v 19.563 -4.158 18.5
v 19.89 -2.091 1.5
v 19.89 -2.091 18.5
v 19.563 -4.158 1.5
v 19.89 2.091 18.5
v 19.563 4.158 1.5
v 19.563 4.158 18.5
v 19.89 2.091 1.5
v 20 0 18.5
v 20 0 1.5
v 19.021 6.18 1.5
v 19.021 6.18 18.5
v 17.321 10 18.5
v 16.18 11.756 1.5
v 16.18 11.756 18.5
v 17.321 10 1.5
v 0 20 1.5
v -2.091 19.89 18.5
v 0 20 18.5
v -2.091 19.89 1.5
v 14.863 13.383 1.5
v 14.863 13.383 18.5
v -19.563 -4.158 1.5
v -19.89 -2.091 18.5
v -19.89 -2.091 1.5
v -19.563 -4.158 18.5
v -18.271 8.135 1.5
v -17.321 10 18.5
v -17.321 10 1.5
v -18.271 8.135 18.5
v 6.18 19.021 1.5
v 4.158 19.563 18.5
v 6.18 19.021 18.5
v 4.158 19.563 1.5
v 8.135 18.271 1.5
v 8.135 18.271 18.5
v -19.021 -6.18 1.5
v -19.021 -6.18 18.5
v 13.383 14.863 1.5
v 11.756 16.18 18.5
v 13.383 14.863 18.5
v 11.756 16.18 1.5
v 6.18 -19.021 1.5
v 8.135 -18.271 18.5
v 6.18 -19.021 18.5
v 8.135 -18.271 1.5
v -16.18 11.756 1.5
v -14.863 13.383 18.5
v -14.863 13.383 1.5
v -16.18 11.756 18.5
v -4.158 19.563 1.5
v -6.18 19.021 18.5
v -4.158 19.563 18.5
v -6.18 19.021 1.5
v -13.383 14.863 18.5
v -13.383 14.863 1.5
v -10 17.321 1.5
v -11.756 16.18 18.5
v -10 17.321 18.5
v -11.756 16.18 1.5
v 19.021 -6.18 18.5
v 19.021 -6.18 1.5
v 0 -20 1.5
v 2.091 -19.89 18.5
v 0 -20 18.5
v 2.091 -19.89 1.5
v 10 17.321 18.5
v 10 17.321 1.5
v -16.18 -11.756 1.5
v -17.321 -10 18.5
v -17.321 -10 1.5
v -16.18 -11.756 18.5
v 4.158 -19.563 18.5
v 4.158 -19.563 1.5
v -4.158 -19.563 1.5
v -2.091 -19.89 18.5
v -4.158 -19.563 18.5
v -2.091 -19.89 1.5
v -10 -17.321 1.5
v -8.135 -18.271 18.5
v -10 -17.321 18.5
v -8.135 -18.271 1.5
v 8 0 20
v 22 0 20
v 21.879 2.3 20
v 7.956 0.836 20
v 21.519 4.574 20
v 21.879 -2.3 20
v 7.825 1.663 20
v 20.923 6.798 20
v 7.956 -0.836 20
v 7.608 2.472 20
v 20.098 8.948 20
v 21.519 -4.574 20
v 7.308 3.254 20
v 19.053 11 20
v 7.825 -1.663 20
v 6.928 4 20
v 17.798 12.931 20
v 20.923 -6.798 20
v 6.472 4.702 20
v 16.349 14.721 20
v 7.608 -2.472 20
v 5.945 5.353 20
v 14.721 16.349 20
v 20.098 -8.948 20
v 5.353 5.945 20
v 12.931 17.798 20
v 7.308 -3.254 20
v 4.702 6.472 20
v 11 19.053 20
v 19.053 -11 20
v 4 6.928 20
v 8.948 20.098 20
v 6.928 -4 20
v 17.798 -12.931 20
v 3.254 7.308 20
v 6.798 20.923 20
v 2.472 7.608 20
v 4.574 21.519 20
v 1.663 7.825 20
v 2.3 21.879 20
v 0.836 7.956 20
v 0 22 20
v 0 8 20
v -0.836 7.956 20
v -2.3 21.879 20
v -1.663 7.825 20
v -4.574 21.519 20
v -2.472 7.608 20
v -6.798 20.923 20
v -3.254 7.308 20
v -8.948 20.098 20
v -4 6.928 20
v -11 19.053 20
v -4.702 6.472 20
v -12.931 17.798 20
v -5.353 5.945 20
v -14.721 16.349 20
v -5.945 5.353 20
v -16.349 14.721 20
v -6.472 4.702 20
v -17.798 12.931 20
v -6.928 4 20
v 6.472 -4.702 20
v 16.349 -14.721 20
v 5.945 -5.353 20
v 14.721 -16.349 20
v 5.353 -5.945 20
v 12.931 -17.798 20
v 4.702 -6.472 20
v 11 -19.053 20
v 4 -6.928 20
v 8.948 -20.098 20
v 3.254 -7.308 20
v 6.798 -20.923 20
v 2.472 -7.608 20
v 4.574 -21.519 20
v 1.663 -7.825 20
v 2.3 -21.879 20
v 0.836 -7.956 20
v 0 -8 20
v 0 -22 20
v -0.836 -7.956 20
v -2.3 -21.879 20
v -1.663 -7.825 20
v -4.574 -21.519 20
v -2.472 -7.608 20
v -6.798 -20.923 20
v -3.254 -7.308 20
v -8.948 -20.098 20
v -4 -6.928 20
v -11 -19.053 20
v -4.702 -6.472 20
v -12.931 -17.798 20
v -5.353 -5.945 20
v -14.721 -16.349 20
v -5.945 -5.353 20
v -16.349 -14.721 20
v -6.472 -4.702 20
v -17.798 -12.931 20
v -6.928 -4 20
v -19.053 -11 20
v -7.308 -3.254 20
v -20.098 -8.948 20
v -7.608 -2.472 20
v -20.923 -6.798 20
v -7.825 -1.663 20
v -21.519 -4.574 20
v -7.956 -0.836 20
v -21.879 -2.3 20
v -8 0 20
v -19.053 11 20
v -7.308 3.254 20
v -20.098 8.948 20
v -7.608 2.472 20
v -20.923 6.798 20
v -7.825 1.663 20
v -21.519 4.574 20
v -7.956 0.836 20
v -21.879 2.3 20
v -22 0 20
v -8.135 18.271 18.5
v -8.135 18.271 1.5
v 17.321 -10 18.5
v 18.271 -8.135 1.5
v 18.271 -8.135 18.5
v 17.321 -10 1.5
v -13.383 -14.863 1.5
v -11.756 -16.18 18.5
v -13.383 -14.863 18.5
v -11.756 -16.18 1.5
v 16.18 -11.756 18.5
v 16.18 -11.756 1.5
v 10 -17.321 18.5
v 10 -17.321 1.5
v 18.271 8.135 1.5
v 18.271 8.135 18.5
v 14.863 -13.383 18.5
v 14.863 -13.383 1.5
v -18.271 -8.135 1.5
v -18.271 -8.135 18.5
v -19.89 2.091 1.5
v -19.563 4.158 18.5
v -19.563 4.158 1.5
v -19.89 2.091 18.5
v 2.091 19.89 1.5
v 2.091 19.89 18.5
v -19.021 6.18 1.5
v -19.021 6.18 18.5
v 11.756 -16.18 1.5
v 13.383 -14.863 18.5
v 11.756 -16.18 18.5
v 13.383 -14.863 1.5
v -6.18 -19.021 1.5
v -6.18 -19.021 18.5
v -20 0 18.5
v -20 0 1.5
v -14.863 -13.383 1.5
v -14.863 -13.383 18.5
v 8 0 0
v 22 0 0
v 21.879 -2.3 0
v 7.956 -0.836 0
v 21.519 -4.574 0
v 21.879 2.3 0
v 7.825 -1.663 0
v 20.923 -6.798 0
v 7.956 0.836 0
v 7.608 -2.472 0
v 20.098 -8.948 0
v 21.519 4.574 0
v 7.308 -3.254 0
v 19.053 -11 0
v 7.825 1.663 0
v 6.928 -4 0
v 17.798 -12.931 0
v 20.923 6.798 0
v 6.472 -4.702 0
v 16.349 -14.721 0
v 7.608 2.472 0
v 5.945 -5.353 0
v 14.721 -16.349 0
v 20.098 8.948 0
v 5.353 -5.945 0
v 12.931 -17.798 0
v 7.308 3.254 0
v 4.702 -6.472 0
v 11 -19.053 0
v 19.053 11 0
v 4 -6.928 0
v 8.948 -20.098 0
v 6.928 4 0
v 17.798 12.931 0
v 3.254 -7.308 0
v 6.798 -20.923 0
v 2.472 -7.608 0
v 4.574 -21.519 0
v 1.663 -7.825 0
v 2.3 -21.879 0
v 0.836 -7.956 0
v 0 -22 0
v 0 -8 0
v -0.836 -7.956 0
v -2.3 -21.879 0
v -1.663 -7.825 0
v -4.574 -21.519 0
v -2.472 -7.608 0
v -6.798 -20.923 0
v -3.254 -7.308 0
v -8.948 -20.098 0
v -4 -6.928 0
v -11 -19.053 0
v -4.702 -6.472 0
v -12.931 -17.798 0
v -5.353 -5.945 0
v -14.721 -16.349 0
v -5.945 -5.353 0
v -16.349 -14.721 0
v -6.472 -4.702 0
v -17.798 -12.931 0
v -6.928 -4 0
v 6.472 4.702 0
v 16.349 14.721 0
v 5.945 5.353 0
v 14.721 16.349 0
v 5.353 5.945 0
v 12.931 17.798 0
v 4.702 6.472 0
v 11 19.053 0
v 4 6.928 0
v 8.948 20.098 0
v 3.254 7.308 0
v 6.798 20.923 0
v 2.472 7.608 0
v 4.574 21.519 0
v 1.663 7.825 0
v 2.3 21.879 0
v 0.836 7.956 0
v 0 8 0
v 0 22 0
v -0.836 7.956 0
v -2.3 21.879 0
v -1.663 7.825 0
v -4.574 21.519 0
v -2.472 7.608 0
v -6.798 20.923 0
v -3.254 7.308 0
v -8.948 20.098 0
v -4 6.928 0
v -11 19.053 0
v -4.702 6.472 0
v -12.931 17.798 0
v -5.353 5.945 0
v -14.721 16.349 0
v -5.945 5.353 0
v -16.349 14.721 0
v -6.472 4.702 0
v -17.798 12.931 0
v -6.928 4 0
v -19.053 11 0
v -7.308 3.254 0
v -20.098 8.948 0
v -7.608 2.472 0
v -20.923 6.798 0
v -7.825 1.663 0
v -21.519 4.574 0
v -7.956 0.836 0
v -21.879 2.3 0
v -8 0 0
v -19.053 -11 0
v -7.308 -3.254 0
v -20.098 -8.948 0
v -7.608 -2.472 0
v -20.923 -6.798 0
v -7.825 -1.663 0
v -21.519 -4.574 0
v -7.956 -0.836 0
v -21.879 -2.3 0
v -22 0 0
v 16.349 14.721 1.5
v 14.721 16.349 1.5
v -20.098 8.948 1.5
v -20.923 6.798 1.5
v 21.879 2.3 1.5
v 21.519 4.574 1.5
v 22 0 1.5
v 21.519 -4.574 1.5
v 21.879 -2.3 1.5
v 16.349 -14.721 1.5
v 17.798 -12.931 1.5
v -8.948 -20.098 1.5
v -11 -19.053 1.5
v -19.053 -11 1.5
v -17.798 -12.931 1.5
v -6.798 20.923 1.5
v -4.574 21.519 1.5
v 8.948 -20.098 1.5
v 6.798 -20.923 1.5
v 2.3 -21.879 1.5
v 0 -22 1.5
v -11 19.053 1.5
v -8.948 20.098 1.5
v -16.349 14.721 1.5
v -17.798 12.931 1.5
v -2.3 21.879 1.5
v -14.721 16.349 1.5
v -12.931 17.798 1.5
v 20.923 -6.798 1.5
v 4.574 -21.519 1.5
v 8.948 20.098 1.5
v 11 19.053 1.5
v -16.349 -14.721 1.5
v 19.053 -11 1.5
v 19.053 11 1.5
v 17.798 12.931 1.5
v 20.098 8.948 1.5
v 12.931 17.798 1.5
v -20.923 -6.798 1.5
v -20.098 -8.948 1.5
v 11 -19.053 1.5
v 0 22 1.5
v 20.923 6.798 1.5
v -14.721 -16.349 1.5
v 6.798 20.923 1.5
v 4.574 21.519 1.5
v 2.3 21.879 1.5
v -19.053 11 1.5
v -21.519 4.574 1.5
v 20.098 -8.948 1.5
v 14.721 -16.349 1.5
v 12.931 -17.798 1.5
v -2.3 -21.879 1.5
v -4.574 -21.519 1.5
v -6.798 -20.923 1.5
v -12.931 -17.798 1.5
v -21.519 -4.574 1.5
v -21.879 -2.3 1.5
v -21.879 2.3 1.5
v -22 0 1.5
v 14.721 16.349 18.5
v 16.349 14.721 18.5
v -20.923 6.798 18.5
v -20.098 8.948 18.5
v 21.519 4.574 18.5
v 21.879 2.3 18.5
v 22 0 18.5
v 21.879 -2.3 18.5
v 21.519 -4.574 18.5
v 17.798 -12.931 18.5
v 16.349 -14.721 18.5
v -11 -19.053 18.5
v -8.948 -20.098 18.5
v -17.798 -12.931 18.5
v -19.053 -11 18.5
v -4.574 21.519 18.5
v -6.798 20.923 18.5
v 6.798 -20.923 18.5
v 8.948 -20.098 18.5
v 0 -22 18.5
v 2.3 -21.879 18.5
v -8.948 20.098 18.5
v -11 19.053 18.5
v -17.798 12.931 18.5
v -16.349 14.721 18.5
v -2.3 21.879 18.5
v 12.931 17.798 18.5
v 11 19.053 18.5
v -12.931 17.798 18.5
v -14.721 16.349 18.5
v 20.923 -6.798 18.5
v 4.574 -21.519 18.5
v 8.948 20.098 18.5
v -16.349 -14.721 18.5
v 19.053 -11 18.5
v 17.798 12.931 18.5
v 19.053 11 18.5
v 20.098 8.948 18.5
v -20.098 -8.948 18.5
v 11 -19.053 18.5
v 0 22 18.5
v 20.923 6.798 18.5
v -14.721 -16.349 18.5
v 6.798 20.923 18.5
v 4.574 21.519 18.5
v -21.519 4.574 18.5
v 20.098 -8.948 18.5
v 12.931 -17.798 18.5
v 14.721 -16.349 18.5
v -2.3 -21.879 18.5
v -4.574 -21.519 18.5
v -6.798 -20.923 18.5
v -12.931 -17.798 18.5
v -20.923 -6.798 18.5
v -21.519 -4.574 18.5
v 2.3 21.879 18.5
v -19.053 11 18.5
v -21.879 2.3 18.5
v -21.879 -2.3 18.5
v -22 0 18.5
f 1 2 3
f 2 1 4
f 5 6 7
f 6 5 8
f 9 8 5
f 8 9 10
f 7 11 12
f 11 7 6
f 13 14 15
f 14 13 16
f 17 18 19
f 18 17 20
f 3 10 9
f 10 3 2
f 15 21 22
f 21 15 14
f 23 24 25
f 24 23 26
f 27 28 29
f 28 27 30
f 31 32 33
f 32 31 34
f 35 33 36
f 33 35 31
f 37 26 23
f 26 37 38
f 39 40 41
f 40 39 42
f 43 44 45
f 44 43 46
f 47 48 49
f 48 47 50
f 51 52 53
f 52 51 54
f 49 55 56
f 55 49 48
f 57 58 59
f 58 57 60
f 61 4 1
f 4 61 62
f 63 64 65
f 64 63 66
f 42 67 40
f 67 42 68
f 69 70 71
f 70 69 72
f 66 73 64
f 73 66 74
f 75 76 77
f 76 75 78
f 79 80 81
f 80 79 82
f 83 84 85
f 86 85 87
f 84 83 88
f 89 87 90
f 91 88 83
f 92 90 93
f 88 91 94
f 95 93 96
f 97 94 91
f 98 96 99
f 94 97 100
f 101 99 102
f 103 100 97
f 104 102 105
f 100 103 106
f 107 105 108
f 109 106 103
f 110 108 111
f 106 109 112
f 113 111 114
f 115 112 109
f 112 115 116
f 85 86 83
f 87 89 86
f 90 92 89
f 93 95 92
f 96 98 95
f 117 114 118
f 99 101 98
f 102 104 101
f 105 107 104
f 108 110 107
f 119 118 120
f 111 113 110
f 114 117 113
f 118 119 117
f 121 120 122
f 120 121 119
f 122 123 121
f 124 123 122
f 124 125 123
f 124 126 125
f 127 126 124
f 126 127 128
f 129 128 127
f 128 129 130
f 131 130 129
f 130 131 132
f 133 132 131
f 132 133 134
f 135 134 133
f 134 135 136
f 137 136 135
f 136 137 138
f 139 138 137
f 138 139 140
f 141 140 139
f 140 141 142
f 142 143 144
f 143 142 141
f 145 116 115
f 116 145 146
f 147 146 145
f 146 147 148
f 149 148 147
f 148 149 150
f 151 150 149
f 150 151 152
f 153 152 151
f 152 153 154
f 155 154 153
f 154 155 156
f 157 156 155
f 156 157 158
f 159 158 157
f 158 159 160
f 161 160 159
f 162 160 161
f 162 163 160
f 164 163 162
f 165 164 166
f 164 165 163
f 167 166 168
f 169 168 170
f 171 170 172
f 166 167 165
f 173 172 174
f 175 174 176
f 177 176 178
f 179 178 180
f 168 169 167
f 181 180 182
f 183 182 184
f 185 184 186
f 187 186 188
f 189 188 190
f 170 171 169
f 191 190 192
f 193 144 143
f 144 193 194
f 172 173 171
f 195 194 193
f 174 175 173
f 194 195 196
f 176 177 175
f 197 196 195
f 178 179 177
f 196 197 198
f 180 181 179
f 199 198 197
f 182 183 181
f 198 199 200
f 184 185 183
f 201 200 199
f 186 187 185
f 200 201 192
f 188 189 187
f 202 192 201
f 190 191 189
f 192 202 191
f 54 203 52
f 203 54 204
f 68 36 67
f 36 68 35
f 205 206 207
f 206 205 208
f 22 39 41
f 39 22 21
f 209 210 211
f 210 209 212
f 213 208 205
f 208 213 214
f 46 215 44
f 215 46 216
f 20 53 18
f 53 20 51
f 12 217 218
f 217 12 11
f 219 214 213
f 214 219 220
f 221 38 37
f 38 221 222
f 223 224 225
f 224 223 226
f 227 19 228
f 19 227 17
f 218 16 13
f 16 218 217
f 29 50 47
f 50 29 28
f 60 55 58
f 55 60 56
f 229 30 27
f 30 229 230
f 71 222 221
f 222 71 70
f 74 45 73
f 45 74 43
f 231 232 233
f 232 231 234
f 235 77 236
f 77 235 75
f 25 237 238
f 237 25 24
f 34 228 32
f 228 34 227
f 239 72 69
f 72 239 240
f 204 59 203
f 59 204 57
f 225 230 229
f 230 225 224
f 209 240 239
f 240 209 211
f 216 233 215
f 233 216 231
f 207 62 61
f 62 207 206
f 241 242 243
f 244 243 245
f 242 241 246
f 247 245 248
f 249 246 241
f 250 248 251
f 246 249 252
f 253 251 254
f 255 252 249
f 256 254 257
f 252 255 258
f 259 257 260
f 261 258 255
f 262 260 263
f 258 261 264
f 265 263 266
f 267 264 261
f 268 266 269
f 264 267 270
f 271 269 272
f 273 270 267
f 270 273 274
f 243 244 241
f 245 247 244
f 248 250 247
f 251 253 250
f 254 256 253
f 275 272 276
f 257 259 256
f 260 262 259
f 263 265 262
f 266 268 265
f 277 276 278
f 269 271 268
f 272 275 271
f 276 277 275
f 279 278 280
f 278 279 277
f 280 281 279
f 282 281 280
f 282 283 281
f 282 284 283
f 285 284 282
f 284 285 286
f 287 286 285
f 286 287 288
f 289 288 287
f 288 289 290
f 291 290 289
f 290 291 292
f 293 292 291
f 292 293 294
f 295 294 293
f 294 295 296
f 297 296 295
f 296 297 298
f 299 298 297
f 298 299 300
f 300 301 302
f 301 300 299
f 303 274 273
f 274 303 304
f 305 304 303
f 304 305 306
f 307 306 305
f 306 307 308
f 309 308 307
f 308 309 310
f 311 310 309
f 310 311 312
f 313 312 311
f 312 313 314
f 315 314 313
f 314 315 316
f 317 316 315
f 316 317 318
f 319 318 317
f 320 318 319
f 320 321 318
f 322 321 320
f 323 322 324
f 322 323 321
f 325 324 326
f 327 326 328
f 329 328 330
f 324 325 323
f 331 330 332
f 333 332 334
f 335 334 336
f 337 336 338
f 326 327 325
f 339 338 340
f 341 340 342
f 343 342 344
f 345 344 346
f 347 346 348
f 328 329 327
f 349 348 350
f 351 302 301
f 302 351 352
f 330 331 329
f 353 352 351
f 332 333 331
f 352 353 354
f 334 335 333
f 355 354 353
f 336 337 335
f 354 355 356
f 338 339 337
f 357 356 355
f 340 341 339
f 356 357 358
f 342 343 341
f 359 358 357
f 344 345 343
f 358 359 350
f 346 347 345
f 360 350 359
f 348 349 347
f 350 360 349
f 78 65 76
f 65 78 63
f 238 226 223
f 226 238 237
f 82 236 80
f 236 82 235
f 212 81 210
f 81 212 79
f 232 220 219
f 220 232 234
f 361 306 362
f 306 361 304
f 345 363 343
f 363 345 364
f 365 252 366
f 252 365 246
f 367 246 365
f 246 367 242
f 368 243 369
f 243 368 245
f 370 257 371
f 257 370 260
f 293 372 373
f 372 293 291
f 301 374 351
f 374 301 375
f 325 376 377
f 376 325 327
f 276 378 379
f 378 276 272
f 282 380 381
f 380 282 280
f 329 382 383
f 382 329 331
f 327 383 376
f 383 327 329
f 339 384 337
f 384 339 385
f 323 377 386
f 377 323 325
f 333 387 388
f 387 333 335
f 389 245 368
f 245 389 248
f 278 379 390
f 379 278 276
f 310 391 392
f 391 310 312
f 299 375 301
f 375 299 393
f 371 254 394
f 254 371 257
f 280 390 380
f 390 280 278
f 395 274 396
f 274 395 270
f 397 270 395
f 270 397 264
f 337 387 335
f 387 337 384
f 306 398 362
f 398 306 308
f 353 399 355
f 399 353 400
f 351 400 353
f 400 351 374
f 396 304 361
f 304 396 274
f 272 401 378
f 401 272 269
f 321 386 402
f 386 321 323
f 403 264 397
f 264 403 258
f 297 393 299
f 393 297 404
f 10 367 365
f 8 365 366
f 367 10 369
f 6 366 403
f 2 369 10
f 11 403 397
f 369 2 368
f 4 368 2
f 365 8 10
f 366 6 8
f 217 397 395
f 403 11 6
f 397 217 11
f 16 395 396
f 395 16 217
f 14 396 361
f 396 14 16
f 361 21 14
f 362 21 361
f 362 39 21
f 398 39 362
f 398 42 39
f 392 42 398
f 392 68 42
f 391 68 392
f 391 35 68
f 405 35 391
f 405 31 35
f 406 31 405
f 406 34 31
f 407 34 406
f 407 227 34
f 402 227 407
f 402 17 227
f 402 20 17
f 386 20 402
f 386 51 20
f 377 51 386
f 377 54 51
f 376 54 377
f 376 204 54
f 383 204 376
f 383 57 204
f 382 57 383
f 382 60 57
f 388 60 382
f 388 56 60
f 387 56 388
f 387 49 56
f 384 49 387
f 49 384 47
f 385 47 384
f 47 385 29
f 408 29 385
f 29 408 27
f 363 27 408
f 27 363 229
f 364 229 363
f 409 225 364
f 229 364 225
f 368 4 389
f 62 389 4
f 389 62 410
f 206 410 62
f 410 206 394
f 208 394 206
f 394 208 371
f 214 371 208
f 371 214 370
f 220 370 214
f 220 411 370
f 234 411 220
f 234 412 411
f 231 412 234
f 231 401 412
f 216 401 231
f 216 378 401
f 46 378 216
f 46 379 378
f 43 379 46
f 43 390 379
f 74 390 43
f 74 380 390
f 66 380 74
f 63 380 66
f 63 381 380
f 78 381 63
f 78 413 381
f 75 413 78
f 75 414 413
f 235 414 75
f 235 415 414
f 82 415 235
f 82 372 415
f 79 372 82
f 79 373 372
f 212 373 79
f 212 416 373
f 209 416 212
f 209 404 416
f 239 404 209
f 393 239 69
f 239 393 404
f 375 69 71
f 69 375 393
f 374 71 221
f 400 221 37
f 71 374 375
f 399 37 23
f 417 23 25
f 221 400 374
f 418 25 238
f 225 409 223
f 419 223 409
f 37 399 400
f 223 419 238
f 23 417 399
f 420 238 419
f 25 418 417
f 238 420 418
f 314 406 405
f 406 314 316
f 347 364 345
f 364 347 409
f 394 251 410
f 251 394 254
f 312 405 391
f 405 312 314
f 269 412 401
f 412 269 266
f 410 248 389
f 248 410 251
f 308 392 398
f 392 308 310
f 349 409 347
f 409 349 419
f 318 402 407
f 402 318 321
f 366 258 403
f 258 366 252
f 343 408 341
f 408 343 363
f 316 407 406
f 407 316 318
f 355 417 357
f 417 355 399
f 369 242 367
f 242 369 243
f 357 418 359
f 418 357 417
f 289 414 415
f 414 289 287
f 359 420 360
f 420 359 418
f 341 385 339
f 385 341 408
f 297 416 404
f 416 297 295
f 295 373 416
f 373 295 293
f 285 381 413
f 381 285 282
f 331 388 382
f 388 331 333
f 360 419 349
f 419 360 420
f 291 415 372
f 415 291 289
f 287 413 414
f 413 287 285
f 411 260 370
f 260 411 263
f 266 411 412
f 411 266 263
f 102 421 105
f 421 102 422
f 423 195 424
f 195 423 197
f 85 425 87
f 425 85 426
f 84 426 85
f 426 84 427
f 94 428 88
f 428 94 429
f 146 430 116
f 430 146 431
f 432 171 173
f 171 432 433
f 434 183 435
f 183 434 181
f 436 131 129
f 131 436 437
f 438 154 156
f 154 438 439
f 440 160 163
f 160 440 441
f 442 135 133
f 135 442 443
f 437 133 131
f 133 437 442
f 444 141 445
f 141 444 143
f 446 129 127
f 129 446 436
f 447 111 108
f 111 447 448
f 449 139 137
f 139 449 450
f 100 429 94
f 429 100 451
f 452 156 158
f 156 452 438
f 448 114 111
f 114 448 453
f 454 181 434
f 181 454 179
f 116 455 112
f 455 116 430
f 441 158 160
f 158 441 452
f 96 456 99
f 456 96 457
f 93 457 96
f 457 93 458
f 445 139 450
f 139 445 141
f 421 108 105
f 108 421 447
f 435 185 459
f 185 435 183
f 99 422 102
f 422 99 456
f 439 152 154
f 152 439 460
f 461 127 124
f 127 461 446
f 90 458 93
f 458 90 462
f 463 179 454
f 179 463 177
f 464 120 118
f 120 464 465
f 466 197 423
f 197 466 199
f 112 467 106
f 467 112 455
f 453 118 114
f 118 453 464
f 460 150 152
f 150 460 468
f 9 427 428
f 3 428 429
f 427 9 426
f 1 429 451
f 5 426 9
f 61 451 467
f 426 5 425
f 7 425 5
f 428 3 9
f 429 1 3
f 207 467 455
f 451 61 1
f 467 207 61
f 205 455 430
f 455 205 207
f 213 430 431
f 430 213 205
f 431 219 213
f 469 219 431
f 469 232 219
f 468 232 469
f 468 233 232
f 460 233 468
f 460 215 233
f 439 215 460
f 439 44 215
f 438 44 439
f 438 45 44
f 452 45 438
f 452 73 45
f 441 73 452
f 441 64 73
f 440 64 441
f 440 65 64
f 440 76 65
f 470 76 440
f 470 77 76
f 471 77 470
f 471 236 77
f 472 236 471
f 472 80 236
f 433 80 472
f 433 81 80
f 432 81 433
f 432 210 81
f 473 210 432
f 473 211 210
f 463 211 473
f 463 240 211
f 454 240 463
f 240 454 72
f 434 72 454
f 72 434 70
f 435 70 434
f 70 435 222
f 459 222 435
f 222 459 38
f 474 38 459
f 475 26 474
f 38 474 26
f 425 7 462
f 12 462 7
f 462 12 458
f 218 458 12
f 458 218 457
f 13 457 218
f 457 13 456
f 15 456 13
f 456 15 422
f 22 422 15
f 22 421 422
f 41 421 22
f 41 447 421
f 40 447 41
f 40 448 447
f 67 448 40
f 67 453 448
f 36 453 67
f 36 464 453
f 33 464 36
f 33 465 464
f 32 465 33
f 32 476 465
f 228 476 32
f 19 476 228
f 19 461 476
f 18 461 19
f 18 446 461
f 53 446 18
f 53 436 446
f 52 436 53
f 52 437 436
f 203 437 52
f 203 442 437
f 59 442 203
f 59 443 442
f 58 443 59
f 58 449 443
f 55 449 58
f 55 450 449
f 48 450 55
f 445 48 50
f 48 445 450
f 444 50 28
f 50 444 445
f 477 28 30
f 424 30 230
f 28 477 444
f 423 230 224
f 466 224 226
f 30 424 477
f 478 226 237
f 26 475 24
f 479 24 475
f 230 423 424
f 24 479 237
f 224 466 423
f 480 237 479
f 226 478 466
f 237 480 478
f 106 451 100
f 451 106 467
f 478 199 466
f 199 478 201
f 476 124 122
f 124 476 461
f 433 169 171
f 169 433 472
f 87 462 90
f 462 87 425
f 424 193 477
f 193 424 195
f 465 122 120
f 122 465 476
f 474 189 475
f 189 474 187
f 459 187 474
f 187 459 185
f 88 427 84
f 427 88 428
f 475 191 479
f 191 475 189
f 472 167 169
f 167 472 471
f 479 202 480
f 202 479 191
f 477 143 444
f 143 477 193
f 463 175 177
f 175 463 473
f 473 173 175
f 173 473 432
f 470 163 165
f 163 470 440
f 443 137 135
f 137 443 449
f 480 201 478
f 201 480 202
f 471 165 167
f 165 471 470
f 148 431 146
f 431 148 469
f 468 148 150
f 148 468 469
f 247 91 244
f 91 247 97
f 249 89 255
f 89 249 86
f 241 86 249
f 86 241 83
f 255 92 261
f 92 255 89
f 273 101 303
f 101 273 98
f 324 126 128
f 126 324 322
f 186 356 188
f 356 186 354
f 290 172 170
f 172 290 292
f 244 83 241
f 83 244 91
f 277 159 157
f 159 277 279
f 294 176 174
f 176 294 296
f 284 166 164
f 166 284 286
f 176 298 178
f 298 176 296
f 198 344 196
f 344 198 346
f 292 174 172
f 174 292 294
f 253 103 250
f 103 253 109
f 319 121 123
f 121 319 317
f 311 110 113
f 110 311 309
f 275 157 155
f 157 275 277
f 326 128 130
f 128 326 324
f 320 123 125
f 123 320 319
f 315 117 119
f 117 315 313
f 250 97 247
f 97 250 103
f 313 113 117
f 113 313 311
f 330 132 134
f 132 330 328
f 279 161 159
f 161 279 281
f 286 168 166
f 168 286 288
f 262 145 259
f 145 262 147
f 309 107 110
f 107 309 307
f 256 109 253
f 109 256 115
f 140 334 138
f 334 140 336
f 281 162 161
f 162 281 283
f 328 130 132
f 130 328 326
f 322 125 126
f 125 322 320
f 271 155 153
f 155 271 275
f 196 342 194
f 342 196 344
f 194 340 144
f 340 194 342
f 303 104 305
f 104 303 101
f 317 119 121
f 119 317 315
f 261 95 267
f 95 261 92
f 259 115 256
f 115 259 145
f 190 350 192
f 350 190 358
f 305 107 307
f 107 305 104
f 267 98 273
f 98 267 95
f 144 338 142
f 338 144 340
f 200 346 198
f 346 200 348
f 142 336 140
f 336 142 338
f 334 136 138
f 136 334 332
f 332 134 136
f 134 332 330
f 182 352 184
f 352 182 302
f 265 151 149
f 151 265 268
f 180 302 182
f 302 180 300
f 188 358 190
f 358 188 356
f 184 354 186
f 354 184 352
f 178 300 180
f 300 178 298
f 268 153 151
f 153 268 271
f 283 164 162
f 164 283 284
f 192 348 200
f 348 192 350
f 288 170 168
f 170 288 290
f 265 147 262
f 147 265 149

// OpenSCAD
// Plain idler pulley with retaining flanges.
$fn = 60;
eps = 0.02;
bore_d = 16;
body_d = 40;
width = 20;
flange_t = 1.5;
difference() {
    union() {
        cylinder(d=body_d,h=width);
        cylinder(d=body_d+4,h=flange_t);
        translate([0,0,width-flange_t]) cylinder(d=body_d+4,h=flange_t);
    }
    translate([0,0,-eps]) cylinder(d=bore_d,h=width+2*eps);
}
